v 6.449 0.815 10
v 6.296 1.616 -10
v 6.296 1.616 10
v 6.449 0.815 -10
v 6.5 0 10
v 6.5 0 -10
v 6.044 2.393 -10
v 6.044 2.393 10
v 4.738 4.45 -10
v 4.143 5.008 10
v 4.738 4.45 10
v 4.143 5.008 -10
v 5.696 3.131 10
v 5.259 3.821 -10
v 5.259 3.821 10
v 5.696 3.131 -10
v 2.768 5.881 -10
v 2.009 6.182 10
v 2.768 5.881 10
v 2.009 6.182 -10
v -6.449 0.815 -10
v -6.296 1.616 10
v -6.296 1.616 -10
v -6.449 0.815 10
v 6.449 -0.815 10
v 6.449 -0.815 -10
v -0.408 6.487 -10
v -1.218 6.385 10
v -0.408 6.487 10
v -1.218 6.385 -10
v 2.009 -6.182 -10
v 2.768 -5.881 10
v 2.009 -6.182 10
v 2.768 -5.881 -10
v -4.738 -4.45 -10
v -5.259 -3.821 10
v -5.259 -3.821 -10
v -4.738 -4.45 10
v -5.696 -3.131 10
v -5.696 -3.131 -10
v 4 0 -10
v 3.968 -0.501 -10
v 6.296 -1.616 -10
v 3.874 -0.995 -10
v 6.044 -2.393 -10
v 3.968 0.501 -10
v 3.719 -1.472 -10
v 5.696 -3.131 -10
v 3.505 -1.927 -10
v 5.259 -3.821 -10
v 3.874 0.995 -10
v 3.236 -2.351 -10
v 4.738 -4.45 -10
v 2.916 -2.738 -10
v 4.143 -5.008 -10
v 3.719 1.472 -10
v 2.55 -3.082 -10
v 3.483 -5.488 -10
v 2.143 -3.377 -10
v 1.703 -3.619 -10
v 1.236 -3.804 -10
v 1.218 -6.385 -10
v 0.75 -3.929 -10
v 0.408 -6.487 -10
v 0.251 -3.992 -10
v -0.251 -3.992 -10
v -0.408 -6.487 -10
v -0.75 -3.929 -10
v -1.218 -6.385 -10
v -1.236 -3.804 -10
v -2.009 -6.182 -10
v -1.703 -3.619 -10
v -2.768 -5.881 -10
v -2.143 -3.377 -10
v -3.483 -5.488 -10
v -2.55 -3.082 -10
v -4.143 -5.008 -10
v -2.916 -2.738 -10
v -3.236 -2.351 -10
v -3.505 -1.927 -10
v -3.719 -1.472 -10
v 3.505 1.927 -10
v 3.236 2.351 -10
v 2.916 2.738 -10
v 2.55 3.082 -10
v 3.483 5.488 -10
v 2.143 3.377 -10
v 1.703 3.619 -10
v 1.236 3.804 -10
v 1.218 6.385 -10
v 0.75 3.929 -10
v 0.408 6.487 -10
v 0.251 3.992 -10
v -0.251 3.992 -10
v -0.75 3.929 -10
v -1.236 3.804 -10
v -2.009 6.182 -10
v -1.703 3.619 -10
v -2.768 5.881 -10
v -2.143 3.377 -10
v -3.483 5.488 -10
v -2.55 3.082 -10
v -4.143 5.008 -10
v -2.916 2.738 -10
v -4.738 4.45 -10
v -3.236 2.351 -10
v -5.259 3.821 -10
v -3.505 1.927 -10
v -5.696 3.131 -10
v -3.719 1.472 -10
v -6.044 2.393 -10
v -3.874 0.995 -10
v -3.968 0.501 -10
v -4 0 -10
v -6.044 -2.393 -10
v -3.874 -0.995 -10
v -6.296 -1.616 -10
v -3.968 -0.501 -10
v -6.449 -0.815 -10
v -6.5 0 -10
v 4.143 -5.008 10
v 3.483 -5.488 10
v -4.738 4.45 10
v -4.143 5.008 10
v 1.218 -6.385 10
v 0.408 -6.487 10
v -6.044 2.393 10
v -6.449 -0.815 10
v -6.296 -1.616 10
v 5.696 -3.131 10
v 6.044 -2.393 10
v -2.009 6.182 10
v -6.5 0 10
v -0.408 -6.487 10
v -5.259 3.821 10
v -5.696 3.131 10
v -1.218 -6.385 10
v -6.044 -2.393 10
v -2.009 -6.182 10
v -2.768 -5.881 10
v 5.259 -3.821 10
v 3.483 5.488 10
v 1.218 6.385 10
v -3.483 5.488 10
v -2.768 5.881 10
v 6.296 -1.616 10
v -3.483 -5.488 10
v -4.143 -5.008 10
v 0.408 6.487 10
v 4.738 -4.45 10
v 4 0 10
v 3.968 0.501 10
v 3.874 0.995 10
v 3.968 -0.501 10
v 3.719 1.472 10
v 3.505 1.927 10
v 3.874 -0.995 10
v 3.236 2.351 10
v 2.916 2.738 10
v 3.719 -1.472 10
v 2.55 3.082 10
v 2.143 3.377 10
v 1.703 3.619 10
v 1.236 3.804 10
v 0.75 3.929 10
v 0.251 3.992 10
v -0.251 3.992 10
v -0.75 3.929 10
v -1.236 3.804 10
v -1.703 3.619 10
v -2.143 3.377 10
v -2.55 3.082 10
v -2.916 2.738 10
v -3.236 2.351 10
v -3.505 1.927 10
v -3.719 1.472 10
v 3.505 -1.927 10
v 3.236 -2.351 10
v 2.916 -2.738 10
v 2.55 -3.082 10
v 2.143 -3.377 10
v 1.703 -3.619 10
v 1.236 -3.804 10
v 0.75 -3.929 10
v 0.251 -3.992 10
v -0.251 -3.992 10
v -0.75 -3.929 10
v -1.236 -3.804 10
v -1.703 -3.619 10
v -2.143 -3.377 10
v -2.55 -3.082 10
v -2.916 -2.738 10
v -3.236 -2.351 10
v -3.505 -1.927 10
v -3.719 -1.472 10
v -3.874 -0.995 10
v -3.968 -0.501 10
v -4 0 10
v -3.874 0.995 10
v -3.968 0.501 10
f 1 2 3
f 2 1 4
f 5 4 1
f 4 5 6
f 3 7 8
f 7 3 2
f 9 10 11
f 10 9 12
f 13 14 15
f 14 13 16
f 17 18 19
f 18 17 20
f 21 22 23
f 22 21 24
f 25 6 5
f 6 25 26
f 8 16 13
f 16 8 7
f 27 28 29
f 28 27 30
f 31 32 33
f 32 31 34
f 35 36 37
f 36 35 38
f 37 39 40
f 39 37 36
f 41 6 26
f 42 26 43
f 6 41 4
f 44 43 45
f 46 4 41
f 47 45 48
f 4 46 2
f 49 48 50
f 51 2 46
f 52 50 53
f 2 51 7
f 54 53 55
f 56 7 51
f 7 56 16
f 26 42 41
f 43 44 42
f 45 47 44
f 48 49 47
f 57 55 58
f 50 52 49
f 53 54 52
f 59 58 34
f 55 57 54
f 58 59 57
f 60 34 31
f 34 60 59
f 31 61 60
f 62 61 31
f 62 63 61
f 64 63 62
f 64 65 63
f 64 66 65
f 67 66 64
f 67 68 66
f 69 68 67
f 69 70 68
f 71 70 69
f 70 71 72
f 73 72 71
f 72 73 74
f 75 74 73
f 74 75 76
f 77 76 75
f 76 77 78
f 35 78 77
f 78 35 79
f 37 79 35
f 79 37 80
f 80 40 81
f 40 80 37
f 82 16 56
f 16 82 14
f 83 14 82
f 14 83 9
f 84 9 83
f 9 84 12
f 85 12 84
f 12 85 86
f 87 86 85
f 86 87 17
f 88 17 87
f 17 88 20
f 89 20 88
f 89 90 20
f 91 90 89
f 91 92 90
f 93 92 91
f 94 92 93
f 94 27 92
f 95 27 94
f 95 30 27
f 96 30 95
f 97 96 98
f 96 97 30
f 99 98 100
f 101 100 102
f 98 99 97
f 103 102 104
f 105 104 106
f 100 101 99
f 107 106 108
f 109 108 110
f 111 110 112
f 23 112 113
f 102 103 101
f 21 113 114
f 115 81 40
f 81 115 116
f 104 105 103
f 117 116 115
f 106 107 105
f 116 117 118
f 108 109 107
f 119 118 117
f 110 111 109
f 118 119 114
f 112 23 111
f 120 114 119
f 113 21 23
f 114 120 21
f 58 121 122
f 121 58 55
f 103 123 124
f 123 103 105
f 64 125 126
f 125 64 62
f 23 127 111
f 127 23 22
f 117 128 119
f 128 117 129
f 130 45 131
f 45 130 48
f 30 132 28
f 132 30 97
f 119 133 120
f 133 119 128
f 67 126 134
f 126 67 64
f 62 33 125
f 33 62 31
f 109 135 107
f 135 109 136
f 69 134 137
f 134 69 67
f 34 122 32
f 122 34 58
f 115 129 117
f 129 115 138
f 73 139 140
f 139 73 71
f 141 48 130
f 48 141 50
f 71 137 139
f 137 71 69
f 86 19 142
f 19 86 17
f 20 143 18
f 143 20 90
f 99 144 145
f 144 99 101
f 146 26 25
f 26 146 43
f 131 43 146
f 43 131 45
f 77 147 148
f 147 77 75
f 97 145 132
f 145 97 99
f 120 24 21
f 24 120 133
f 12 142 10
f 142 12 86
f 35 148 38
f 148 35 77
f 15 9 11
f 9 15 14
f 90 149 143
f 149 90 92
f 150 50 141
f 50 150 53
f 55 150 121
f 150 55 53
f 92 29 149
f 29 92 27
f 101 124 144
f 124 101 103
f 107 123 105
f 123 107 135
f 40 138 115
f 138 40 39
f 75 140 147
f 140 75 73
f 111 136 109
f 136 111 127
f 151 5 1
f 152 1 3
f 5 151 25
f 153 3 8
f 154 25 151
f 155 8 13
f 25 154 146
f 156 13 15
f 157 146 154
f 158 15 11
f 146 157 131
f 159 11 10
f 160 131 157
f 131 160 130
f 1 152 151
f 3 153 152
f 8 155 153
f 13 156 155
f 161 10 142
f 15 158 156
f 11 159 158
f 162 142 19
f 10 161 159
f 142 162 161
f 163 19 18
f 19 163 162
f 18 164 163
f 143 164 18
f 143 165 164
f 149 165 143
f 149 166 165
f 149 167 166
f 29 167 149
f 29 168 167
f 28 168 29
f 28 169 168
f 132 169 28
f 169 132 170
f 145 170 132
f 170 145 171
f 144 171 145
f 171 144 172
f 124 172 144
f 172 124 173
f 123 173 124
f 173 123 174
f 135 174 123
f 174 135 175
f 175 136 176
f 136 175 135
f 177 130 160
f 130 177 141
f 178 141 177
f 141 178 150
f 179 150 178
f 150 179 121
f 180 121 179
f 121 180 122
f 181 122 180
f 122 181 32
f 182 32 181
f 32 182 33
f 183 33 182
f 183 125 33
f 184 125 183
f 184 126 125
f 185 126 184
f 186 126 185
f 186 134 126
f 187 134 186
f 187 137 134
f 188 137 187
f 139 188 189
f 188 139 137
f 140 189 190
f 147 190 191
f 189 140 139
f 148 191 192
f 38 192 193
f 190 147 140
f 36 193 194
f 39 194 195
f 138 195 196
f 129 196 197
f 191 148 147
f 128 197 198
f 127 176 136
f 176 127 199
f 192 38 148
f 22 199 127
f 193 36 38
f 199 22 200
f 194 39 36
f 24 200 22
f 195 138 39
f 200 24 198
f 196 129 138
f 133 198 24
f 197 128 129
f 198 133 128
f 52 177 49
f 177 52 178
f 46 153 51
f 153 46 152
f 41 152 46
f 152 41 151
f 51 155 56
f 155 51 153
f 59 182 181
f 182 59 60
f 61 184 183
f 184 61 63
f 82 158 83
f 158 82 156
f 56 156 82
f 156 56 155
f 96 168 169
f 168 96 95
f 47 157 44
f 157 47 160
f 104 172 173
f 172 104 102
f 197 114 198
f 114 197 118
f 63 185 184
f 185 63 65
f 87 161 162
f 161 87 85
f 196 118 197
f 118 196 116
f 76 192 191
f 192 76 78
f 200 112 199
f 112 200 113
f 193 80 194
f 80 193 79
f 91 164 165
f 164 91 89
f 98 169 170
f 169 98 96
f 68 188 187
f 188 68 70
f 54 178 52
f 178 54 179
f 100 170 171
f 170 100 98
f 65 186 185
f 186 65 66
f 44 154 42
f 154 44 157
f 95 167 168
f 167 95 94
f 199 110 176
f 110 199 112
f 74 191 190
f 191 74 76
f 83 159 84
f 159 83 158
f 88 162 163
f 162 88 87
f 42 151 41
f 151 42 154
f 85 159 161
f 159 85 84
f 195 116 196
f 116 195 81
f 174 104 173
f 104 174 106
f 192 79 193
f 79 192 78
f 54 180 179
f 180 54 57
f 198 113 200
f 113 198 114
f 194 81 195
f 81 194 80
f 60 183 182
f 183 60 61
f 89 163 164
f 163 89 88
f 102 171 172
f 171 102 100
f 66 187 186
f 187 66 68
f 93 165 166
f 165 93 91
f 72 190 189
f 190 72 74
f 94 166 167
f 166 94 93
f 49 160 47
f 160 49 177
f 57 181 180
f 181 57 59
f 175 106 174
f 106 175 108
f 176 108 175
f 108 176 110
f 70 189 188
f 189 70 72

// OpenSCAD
$fn = 50;


difference() {
	union() {
		translate(v = [0, 0, -10.0000000000]) {
			cylinder(h = 20, r = 6.5000000000);
		}
	}
	union() {
		translate(v = [0, 0, -100.0000000000]) {
			cylinder(h = 200, r = 4.0000000000);
		}
	}
}
